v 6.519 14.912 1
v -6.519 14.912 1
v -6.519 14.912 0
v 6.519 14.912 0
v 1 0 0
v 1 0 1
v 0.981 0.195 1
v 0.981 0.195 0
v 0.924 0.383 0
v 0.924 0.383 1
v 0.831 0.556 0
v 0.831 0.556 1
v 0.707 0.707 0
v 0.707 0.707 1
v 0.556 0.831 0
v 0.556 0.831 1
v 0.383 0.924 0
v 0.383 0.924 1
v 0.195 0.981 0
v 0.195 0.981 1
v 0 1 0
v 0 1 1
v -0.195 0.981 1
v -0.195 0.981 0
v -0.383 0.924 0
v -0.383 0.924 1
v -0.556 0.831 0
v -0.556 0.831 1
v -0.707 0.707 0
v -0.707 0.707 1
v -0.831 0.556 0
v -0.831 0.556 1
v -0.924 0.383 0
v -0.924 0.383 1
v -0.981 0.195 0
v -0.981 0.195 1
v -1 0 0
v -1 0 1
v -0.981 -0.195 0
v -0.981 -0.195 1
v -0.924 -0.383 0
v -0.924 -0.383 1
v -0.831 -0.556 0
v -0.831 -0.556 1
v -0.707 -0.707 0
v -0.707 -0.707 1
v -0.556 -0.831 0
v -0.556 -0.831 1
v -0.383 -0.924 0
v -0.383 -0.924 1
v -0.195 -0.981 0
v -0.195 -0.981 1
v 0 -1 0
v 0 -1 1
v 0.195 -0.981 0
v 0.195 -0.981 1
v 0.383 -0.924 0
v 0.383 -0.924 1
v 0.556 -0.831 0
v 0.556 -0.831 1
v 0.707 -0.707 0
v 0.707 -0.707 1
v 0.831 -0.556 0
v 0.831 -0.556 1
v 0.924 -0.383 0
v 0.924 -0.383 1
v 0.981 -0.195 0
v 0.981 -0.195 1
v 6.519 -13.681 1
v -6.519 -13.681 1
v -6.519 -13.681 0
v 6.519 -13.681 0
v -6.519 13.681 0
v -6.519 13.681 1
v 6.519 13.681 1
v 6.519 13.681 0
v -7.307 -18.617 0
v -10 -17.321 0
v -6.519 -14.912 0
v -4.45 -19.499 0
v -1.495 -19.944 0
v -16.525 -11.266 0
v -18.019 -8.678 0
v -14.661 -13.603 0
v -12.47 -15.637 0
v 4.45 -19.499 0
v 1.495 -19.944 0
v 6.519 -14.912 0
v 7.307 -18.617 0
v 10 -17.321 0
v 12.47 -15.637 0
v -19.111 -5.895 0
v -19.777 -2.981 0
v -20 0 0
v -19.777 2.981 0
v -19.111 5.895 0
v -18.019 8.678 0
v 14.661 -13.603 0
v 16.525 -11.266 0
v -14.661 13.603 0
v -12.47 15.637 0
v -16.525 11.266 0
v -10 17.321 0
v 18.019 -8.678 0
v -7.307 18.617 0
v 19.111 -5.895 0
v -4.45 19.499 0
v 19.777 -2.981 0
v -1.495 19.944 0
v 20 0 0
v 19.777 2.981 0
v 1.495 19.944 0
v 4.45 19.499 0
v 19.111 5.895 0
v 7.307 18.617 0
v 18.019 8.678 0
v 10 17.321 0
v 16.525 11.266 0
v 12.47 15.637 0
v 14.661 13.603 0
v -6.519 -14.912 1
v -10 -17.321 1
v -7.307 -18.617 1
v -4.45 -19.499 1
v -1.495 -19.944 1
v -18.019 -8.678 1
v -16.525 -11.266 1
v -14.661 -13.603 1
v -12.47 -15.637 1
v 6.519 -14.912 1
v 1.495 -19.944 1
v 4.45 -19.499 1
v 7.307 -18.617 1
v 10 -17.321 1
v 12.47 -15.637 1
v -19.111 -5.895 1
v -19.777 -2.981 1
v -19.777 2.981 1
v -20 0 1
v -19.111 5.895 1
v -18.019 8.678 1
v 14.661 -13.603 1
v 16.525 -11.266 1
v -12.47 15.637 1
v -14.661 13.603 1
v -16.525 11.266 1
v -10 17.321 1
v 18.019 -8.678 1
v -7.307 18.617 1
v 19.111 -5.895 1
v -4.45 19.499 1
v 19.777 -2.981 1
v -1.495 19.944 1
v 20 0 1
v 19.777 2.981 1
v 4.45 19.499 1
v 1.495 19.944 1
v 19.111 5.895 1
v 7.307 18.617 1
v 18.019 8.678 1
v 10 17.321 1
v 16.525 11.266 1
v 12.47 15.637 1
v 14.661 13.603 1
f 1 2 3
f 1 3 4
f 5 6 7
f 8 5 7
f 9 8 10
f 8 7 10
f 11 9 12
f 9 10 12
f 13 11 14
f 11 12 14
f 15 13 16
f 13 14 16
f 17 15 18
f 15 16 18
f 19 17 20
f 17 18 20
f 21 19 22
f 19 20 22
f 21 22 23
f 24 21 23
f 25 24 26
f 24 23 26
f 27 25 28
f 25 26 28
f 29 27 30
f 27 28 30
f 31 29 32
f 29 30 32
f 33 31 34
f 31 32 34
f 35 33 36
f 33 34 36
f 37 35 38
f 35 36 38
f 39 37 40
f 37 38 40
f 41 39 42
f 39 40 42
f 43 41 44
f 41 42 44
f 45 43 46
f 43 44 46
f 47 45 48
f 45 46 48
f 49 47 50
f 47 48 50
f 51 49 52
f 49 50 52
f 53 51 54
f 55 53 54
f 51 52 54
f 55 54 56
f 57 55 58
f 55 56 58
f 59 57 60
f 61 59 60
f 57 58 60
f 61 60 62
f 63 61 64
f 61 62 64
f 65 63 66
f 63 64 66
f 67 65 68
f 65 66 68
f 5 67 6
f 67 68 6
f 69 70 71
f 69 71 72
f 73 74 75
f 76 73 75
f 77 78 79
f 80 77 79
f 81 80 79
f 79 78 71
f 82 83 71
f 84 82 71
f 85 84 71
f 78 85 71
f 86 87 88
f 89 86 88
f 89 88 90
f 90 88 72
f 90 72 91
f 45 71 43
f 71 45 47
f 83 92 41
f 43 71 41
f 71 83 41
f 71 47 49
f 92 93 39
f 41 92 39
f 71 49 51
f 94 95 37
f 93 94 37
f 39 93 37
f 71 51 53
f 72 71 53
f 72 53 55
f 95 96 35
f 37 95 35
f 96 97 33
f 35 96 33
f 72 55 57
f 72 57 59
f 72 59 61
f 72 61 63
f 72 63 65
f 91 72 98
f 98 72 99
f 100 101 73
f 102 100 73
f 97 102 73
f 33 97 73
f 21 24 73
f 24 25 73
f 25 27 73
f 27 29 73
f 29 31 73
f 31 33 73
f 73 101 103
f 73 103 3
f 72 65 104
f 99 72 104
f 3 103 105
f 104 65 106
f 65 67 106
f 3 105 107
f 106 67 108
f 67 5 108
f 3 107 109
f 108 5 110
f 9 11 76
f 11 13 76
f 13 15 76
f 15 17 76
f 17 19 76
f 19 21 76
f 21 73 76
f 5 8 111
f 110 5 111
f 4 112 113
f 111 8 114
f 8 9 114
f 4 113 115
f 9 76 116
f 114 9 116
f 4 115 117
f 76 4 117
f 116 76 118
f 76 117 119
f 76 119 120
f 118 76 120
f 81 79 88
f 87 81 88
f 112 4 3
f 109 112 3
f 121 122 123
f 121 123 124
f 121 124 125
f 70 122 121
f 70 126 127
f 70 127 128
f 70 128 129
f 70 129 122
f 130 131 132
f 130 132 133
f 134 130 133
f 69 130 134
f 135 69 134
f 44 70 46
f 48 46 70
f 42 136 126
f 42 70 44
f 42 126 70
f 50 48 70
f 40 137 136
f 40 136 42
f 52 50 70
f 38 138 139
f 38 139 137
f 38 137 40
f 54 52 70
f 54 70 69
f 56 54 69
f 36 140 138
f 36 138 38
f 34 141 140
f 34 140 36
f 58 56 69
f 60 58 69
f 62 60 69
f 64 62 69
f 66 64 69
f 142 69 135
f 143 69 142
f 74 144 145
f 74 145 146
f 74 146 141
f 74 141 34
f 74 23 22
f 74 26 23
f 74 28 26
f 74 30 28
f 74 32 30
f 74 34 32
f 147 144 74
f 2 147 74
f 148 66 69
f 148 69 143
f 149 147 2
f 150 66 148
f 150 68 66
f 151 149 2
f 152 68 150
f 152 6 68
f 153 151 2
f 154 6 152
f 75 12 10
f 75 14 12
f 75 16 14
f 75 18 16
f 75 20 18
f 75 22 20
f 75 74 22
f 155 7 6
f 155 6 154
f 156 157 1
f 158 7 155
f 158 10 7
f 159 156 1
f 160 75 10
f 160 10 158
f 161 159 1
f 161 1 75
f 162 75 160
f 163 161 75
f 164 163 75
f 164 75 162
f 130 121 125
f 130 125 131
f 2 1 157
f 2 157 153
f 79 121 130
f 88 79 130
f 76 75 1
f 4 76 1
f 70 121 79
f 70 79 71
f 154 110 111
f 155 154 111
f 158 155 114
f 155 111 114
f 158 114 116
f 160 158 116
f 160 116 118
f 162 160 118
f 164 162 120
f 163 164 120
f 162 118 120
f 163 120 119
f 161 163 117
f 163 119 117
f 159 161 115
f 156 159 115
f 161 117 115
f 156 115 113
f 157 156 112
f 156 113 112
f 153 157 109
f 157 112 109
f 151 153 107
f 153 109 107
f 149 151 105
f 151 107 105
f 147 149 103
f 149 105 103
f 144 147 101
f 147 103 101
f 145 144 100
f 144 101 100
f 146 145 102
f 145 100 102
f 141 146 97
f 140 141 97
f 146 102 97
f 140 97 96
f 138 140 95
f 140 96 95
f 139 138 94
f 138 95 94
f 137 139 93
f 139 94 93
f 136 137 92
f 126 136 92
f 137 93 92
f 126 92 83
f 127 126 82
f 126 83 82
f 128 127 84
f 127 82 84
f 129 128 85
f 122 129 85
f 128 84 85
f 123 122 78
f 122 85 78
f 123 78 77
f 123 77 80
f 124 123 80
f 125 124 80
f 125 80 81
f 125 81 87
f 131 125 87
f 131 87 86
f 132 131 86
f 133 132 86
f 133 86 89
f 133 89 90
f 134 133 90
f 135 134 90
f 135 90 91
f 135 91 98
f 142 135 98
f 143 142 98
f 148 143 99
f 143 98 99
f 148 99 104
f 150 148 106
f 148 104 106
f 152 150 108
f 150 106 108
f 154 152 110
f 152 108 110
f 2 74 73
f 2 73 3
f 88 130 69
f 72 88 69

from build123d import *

# Parameters (mm, degrees)
SKETCH1_R           = 20
BOSS_EXTRUDE1_DEPTH = 1
SKETCH2_W           = 13.037346626
SKETCH2_H           = 1.230994102
CUT_EXTRUDE1_DEPTH  = 1
SKETCH3_R           = 1
CUT_EXTRUDE2_DEPTH  = 1


with BuildPart() as part:
    # Sketch1 → Boss-Extrude1 (new body)
    with BuildSketch(Plane.XY):
        Circle(SKETCH1_R)
    extrude(amount=BOSS_EXTRUDE1_DEPTH)

    # Sketch2 → Cut-Extrude1 (cut)
    with BuildSketch(Plane.XY.offset(1)):
        with Locations((0, -14.296317866)):
            Rectangle(SKETCH2_W, SKETCH2_H)
        with Locations((0, 14.296317866)):
            Rectangle(SKETCH2_W, SKETCH2_H)
    extrude(amount=-CUT_EXTRUDE1_DEPTH, mode=Mode.SUBTRACT)

    # Sketch3 → Cut-Extrude2 (cut)
    with BuildSketch(Plane.XY.offset(1)):
        Circle(SKETCH3_R)
    extrude(amount=-CUT_EXTRUDE2_DEPTH, mode=Mode.SUBTRACT)


solid = part.part
